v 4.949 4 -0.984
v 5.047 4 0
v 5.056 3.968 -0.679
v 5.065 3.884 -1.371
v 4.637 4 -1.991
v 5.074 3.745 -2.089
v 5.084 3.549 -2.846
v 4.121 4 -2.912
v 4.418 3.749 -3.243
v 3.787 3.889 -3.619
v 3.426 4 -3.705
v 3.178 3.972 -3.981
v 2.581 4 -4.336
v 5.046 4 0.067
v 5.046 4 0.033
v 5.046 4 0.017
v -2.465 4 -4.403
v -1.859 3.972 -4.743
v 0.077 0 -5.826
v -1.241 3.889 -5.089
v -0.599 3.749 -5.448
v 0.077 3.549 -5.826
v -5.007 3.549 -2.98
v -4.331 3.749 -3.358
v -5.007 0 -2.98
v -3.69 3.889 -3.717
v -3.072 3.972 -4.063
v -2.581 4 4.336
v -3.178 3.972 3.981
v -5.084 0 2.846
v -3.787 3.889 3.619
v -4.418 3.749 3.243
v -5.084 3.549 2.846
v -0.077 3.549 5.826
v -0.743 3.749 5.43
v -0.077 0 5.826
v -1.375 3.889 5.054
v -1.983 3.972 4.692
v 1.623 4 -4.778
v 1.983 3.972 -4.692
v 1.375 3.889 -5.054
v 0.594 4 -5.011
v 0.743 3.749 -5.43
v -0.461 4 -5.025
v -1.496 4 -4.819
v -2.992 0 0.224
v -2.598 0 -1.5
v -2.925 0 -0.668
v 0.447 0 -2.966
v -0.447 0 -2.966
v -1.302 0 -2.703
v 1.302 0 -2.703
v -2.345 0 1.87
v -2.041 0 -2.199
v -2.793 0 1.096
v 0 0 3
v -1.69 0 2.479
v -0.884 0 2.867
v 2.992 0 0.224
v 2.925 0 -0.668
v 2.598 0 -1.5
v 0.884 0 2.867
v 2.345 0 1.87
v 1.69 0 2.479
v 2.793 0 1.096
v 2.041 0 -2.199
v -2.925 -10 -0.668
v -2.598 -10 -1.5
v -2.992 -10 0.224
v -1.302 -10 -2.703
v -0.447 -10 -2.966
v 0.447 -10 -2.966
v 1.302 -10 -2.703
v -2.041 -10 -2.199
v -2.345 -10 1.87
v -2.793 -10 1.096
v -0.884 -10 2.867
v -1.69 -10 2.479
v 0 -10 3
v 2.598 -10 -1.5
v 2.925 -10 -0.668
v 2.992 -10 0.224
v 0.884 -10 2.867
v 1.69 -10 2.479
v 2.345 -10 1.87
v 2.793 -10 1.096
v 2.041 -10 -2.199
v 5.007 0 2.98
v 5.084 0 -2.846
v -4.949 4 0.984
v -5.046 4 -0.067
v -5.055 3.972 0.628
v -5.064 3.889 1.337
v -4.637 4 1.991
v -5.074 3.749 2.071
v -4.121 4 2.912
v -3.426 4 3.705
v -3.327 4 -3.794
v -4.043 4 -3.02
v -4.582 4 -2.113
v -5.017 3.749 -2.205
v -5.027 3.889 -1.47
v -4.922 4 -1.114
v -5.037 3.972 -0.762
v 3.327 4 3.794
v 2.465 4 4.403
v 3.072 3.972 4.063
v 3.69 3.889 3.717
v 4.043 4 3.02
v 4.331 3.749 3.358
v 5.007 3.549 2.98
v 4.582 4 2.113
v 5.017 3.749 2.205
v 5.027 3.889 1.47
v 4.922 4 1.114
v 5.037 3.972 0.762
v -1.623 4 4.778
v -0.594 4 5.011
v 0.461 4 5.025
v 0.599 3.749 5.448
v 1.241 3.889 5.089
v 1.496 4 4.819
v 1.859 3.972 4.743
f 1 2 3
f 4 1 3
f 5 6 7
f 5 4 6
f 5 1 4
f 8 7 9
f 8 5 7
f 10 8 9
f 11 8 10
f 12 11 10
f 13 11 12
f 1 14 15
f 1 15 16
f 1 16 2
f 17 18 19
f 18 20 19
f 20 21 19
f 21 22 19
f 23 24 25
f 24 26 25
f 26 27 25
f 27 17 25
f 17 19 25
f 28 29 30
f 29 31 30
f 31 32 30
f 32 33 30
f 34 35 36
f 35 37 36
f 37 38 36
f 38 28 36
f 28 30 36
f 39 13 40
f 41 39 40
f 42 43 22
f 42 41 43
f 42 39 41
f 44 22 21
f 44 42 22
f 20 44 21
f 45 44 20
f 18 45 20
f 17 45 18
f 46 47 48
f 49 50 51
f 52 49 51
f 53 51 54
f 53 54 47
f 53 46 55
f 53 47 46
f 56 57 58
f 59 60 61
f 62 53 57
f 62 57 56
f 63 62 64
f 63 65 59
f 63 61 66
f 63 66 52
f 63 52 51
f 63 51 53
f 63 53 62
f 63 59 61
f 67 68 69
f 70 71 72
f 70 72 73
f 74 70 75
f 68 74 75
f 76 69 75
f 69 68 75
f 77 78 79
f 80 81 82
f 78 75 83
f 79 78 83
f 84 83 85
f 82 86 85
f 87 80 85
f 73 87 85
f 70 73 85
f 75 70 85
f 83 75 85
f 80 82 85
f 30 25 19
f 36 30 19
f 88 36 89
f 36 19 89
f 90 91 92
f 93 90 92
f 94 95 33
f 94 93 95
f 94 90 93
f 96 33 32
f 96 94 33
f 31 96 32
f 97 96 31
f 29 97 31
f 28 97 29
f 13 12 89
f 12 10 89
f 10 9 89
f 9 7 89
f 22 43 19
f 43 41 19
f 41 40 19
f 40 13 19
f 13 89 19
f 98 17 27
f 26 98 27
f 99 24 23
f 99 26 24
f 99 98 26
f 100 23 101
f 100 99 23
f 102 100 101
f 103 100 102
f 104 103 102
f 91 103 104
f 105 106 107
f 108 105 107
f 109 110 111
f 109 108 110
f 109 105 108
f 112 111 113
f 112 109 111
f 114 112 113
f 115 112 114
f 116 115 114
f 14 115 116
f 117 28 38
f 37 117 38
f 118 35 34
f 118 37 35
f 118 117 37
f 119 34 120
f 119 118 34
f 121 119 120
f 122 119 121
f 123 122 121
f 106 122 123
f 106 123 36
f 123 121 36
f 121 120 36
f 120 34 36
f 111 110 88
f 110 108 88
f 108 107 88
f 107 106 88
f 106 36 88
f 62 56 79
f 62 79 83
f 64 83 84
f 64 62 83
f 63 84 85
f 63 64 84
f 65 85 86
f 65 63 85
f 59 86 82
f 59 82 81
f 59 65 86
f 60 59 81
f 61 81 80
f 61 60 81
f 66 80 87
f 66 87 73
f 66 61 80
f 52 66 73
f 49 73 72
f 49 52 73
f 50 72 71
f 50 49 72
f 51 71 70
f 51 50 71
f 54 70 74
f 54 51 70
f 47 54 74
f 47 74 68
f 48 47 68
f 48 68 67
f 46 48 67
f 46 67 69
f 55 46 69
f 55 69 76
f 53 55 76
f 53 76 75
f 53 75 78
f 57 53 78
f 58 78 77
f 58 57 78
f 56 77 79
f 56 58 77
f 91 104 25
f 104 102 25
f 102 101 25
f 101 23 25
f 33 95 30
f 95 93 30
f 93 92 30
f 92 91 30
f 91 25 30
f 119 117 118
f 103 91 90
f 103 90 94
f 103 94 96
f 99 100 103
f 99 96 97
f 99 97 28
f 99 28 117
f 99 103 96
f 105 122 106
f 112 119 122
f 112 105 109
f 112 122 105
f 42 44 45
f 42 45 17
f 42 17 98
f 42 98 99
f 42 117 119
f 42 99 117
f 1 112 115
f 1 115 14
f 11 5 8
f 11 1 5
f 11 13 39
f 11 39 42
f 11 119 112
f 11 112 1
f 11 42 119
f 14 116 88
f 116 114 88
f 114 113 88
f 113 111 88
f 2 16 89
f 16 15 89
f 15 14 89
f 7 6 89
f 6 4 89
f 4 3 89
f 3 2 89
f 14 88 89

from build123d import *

# Parameters (mm, degrees)
SKETCH1_R           = 3
BOSS_EXTRUDE1_DEPTH = 10
BOSS_EXTRUDE2_DEPTH = 4
SKETCH3_OUTSIDE_W   = 64.838
SKETCH3_OUTSIDE_H   = 66.322
SKETCH3_OUTSIDE_R   = 5.046144313
CUT_EXTRUDE10_DEPTH = 14
CUT_EXTRUDE10_DRAFT = -60


with BuildPart() as part:
    # Sketch1 → Boss-Extrude1 (new body)
    with BuildSketch(Plane(origin=(0, 0, 0), x_dir=(1, 0, 0), z_dir=(0, 1, 0))):
        with Locations(Location((0, 0, 0), (0, 0, 270))):
            Circle(SKETCH1_R)
    extrude(amount=-BOSS_EXTRUDE1_DEPTH)


with BuildPart() as body_2:
    # Sketch2 → Boss-Extrude2 (new body)
    with BuildSketch(Plane(origin=(0, 0, 0), x_dir=(1, 0, 0), z_dir=(0, 1, 0))):
        Polygon((5.084186, 2.846486013), (0.076963801, 5.82627724), (-5.007222199, 2.979791227), (-5.084186, -2.846486013), (-0.076963801, -5.82627724), (5.007222199, -2.979791227), align=None)
    extrude(amount=BOSS_EXTRUDE2_DEPTH)


with BuildPart() as cut_extrude10_tool:
    # Sketch3 outside → Cut-Extrude10 (with draft: the straight prism first)
    with BuildSketch(Plane(origin=(0, 4, 0), x_dir=(1, 0, 0), z_dir=(0, 1, 0))):
        Rectangle(SKETCH3_OUTSIDE_W, SKETCH3_OUTSIDE_H)
        Circle(SKETCH3_OUTSIDE_R, mode=Mode.SUBTRACT)
    extrude(amount=-CUT_EXTRUDE10_DEPTH)
    # Cut-Extrude10: the draft: its side faces are tilted about the plane it starts from
    cut_extrude10_sides = [cut_extrude10_tool.faces().sort_by_distance(p)[0] for p in [
        (0, -3, 33.161),
        (32.419, -3, 0),
        (0, -3, -33.161),
        (-32.419, -3, 0),
        (-5.046144313, -3, 0),
    ]]
    draft(cut_extrude10_sides, Plane(origin=(0, 4, 0), x_dir=(1, 0, 0), z_dir=(0, 1, 0)), CUT_EXTRUDE10_DRAFT)


with BuildPart() as body_2_1:
    add(body_2.part)

    # Cut-Extrude10: cut by cut_extrude10_tool
    add(cut_extrude10_tool.part, mode=Mode.SUBTRACT)


solid = Compound([part.part, body_2_1.part])
